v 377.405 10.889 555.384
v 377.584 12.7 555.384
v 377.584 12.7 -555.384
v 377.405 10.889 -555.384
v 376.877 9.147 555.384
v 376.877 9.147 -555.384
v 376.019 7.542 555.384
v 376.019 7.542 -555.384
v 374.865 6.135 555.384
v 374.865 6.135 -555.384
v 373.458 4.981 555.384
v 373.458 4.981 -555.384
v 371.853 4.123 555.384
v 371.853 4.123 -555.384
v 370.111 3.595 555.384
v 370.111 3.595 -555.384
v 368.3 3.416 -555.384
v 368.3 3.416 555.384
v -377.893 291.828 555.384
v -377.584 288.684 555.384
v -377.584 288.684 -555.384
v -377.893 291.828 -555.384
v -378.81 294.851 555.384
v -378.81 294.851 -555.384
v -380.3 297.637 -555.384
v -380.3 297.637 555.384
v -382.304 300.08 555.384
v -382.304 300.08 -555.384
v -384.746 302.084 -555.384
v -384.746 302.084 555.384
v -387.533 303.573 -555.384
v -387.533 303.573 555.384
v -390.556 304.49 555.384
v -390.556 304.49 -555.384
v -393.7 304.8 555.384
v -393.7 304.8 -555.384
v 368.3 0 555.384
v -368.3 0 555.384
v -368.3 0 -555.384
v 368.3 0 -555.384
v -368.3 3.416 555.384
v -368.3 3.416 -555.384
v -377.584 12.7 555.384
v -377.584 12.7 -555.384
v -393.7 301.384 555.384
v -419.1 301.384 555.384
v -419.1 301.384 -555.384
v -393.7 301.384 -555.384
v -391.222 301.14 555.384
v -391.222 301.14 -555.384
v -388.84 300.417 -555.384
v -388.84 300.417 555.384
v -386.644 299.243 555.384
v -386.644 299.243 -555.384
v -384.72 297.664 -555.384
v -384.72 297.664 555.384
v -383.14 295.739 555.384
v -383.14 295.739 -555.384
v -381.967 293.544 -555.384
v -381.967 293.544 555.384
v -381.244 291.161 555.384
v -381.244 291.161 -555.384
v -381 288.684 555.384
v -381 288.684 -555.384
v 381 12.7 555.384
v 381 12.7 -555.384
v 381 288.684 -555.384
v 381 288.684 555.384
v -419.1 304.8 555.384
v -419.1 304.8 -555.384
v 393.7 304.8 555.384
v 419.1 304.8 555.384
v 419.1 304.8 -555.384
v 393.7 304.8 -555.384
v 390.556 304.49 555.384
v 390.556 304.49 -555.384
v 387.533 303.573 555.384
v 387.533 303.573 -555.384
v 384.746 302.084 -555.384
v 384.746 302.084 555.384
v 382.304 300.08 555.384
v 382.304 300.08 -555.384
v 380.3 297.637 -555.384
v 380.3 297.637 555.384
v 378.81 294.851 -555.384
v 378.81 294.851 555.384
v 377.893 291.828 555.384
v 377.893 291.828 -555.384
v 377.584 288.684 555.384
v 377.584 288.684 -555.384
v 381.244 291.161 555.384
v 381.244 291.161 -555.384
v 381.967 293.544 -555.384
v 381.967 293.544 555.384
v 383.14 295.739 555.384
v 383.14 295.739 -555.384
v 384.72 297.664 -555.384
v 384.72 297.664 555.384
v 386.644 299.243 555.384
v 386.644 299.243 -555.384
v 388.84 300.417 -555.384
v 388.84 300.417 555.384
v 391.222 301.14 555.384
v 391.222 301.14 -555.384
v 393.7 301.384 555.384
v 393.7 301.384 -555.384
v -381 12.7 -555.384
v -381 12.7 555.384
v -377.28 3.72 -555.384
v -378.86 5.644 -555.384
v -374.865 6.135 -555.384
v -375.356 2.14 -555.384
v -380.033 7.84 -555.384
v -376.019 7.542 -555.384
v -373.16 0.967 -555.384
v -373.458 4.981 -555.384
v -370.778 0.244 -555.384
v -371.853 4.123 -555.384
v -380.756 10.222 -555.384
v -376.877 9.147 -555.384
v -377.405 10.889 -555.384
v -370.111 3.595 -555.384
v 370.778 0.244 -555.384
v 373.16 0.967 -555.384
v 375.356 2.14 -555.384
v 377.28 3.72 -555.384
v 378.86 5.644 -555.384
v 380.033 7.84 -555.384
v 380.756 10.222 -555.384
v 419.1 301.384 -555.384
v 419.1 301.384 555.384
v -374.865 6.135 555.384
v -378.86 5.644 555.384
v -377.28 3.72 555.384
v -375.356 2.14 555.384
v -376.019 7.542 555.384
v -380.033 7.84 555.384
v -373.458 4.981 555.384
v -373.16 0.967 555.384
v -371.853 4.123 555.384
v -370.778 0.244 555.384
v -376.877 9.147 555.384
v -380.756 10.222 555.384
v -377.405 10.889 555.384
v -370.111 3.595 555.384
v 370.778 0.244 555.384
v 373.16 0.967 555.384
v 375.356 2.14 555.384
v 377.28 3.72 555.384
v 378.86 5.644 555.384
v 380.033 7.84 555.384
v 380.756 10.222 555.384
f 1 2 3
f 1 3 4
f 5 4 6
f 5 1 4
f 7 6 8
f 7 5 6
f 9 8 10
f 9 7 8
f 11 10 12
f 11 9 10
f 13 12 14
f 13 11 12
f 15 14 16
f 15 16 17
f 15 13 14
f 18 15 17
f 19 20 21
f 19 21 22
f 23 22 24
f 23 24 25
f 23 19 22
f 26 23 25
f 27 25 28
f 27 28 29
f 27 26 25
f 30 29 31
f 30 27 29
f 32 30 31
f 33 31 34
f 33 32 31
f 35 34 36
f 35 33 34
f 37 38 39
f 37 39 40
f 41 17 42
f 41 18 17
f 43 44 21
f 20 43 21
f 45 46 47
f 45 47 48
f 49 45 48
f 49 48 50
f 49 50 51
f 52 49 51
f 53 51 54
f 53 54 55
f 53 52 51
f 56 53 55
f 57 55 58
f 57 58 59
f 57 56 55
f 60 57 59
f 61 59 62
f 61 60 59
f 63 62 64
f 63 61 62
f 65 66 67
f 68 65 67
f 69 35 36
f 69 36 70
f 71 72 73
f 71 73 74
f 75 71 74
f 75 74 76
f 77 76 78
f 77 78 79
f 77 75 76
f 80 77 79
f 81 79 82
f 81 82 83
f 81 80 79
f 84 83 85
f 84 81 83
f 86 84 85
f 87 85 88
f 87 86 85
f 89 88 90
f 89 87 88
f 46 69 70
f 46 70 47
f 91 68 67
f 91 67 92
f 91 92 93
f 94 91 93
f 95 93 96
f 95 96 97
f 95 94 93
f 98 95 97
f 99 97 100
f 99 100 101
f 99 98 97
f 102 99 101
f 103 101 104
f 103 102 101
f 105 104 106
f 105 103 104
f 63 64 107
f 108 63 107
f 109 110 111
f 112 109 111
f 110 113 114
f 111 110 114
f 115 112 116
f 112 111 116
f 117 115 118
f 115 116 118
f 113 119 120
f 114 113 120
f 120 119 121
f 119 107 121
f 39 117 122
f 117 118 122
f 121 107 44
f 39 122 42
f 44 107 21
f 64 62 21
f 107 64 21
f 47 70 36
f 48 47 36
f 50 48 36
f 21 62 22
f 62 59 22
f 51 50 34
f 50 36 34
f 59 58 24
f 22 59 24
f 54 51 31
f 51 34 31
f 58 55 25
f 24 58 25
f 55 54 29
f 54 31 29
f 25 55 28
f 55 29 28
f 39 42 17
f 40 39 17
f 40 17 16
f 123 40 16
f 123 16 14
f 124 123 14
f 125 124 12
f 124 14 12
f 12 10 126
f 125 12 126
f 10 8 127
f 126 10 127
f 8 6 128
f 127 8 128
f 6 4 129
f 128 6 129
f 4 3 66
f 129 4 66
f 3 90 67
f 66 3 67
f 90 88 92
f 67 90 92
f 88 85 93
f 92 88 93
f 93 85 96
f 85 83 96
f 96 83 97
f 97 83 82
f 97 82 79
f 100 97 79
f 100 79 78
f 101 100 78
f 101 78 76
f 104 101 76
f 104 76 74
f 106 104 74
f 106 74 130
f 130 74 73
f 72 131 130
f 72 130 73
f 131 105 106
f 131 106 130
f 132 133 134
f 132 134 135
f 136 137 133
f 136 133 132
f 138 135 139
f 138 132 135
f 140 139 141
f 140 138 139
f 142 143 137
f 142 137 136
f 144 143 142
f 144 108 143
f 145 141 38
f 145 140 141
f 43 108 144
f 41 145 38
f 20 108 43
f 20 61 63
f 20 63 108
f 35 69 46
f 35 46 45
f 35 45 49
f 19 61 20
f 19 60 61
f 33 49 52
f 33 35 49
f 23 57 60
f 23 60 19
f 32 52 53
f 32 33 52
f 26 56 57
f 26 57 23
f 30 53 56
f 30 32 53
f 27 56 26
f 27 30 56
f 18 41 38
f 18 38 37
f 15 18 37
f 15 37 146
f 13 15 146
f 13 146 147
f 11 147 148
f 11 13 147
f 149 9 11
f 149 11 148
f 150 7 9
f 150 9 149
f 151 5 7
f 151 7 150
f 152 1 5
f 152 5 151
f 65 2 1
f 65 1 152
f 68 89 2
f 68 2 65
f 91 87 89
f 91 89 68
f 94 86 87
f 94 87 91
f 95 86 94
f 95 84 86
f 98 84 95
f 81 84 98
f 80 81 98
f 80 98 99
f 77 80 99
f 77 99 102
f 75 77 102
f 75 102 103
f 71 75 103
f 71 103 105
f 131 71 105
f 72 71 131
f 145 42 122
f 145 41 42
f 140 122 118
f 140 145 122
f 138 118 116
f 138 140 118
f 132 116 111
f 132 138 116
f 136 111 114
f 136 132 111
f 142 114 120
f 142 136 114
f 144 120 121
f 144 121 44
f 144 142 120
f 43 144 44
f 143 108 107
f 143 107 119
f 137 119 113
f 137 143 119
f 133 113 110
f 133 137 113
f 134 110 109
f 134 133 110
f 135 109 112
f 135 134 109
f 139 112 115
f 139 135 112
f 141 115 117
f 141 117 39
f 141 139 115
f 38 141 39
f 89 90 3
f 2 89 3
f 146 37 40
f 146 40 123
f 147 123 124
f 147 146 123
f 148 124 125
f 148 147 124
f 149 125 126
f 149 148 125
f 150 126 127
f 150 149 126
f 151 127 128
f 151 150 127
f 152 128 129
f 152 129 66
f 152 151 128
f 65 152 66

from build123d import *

# Parameters (mm, degrees)
BASE_DEPTH = 555.3837


with BuildPart() as part:
    # Sketch1 → Base (new body, symmetric)
    with BuildSketch(Plane.XY):
        with BuildLine():
            Line((-377.5837, 12.7), (-377.5837, 288.6837))
            ThreePointArc((-377.5837, 288.6837), (-382.304054982, 300.079645018), (-393.7, 304.8))
            Line((-393.7, 304.8), (-419.1, 304.8))
            Line((-419.1, 304.8), (-419.1, 301.3837))
            Line((-419.1, 301.3837), (-393.7, 301.3837))
            ThreePointArc((-393.7, 301.3837), (-384.719743879, 297.663956121), (-381, 288.6837))
            Line((-381, 288.6837), (-381, 12.7))
            ThreePointArc((-381, 12.7), (-377.280256121, 3.719743879), (-368.3, 0))
            Line((-368.3, 0), (368.3, 0))
            ThreePointArc((368.3, 0), (377.280256121, 3.719743879), (381, 12.7))
            Line((381, 12.7), (381, 288.6837))
            ThreePointArc((381, 288.6837), (384.719743879, 297.663956121), (393.7, 301.3837))
            Line((393.7, 301.3837), (419.1, 301.3837))
            Line((419.1, 301.3837), (419.1, 304.8))
            Line((419.1, 304.8), (393.7, 304.8))
            ThreePointArc((393.7, 304.8), (382.304054982, 300.079645018), (377.5837, 288.6837))
            Line((377.5837, 288.6837), (377.5837, 12.7))
            ThreePointArc((377.5837, 12.7), (374.864567225, 6.135432775), (368.3, 3.4163))
            Line((368.3, 3.4163), (-368.3, 3.4163))
            ThreePointArc((-368.3, 3.4163), (-374.864567225, 6.135432775), (-377.5837, 12.7))
        make_face()
    extrude(amount=BASE_DEPTH, both=True)


solid = part.part
